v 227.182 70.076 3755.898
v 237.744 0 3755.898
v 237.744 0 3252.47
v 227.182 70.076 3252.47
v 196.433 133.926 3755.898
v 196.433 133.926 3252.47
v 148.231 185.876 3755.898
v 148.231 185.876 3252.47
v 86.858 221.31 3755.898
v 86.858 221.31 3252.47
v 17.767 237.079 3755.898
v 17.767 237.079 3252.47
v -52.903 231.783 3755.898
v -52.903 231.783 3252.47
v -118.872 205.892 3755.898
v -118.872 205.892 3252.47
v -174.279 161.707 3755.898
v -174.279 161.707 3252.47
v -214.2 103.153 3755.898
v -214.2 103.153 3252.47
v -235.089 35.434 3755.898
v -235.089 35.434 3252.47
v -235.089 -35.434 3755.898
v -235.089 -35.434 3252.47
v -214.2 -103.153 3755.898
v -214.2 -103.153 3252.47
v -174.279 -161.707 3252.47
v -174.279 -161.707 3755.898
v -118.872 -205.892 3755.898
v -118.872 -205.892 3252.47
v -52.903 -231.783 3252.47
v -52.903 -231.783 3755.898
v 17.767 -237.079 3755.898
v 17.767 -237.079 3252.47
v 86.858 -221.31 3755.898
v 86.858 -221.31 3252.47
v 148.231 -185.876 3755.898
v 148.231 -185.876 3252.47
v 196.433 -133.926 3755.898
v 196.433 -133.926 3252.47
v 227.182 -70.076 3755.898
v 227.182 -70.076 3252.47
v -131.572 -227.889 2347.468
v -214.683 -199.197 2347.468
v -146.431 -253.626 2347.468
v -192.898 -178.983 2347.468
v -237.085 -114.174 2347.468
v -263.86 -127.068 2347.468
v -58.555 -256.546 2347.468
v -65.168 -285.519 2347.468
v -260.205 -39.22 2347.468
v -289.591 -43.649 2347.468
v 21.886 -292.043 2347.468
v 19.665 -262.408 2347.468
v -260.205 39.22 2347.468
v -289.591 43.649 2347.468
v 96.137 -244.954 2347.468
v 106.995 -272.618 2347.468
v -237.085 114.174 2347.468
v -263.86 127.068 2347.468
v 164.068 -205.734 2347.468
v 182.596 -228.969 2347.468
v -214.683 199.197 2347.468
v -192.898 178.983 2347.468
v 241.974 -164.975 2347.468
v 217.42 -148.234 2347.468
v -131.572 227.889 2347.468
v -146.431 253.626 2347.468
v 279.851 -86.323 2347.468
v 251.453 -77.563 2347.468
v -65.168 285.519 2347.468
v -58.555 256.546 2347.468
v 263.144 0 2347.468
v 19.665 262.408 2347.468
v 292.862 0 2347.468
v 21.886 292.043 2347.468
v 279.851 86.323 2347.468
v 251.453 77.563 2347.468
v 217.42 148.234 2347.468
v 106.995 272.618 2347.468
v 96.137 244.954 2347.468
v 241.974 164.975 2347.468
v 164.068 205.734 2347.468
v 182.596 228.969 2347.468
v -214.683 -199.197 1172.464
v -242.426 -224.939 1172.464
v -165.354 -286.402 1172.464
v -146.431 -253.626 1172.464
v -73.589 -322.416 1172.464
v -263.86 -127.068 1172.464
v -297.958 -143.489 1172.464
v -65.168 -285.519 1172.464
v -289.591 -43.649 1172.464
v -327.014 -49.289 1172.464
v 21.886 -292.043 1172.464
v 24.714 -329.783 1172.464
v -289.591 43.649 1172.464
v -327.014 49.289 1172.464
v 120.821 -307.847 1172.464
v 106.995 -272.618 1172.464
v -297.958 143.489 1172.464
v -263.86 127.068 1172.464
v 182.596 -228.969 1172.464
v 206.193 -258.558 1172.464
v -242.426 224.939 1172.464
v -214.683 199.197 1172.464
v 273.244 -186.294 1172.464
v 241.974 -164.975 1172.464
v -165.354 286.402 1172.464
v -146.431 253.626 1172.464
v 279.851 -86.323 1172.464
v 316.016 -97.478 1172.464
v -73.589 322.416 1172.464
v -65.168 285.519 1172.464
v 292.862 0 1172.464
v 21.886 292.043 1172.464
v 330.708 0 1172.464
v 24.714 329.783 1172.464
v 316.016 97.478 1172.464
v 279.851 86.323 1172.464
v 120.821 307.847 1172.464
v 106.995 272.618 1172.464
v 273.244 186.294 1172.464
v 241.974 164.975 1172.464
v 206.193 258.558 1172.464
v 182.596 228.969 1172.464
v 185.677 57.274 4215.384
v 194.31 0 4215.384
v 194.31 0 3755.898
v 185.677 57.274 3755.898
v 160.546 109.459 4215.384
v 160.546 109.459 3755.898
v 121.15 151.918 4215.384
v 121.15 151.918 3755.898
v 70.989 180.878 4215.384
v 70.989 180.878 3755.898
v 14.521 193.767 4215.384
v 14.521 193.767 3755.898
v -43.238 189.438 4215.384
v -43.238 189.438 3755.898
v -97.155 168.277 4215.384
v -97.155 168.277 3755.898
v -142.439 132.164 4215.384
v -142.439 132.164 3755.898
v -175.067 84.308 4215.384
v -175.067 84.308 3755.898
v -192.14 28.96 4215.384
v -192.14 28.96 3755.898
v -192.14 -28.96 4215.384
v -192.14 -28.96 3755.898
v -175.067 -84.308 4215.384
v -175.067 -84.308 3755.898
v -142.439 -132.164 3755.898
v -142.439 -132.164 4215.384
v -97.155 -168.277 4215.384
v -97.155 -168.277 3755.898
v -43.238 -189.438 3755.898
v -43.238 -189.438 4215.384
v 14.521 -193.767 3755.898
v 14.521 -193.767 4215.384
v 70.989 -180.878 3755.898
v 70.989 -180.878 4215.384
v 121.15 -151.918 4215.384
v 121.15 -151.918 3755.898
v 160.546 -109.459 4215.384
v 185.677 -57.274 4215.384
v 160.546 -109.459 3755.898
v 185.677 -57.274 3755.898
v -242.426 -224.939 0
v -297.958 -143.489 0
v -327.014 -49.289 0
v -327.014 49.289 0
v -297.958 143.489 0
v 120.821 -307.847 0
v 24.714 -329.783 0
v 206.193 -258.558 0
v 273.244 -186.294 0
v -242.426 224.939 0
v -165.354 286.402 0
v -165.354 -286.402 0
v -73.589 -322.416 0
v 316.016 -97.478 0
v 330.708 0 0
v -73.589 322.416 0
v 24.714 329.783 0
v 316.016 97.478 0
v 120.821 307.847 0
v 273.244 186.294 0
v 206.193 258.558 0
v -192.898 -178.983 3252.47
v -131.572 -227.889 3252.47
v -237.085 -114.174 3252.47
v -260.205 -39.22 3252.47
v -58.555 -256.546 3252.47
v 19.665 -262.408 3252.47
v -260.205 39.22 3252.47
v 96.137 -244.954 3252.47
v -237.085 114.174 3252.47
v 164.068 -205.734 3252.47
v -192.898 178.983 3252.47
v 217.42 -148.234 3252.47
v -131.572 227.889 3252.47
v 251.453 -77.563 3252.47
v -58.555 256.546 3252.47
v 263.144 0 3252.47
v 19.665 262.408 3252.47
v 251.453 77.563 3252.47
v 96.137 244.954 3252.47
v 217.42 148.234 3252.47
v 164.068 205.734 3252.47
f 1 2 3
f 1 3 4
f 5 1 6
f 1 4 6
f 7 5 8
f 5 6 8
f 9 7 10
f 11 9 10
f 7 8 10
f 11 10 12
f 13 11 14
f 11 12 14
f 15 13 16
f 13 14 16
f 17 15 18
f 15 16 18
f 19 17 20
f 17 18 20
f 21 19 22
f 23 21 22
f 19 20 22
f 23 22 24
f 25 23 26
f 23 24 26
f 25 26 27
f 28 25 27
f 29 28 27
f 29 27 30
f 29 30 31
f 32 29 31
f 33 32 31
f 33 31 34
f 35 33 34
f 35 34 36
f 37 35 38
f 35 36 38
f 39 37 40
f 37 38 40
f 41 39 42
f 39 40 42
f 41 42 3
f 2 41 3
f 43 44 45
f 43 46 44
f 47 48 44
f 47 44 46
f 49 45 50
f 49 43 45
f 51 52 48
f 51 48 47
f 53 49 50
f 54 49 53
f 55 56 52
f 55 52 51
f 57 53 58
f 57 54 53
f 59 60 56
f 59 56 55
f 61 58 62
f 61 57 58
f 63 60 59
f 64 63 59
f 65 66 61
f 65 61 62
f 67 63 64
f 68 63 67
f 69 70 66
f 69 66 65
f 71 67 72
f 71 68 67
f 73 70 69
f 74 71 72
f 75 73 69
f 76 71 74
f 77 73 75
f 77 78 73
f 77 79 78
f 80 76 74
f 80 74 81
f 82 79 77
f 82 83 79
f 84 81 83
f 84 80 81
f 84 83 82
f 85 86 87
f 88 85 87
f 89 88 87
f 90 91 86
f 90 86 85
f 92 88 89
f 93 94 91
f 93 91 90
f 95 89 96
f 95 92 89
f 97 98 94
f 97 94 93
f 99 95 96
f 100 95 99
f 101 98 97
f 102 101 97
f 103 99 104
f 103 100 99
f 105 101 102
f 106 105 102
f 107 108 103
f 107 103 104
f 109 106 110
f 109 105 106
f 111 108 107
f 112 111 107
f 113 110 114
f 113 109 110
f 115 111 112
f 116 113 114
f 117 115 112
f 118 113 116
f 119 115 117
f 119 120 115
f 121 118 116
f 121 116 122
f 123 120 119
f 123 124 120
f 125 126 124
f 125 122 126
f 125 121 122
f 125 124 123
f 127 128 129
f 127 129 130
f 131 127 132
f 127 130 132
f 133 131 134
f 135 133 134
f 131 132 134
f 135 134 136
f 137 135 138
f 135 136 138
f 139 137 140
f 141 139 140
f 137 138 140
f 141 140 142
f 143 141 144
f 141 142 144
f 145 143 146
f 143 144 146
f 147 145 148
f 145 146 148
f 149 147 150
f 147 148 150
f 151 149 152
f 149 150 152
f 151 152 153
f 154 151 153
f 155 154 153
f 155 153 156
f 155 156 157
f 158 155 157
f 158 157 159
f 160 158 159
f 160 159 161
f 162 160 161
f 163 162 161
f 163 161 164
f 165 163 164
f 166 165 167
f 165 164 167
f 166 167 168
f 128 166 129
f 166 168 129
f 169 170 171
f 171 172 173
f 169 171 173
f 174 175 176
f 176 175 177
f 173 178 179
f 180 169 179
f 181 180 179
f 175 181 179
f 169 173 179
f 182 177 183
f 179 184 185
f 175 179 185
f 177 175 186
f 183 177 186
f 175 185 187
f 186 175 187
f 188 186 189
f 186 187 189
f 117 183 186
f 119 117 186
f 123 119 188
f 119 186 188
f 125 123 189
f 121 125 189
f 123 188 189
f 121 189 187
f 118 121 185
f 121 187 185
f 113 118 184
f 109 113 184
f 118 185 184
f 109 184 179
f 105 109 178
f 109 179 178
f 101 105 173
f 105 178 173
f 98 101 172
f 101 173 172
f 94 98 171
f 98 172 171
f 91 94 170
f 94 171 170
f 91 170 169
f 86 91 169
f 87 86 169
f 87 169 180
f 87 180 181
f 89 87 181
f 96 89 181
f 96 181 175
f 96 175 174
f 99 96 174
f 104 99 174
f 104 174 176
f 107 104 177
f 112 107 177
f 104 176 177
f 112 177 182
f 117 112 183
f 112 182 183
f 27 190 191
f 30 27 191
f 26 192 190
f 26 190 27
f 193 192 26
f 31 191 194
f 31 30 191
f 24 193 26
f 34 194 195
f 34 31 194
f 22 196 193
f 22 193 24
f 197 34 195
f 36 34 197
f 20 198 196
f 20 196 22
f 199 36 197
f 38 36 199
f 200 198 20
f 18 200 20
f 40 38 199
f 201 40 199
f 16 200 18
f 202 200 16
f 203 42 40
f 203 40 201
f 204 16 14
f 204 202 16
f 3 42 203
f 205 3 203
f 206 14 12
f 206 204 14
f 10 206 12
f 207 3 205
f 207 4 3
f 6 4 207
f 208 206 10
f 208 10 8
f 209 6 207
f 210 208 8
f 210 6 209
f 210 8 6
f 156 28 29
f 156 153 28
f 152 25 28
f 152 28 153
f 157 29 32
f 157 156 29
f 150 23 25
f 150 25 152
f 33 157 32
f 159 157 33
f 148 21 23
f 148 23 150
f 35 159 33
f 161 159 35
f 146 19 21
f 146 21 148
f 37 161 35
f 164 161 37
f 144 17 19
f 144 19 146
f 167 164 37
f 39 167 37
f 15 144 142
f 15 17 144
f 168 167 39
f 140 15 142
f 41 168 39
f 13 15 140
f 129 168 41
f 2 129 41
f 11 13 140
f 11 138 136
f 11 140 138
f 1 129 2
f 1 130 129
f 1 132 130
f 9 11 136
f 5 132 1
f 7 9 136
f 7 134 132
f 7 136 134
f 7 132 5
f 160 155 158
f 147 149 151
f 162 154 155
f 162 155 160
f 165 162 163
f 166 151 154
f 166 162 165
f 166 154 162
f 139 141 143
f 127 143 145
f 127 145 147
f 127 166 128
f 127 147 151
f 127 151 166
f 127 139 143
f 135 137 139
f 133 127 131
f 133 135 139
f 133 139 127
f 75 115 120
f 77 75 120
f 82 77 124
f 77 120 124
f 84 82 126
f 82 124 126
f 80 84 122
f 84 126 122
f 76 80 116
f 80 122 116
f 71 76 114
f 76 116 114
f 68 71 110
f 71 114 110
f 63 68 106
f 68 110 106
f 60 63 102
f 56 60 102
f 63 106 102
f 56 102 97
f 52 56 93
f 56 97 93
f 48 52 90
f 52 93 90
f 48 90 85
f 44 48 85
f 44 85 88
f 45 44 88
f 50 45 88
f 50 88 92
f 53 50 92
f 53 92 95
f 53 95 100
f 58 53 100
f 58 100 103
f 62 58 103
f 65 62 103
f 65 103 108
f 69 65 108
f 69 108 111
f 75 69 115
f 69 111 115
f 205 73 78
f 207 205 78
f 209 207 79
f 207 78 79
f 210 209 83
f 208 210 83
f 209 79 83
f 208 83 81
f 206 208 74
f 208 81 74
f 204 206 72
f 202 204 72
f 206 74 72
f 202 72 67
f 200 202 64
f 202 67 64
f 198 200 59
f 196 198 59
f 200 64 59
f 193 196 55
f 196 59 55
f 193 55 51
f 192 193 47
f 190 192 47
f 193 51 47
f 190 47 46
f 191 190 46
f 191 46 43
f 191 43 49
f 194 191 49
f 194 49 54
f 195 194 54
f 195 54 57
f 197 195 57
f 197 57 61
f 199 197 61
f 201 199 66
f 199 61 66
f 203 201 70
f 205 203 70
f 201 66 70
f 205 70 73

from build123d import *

# Parameters (mm, degrees)
F0_R     = 330.708
F1_DEPTH = 1172.464
F2_R     = 292.862
F3_DEPTH = 1175.004
F4_R     = 263.144
F5_DEPTH = 905.002
F6_R     = 237.744
F7_DEPTH = 503.428
F8_R     = 194.31
F9_DEPTH = 459.486


with BuildPart() as f1:
    # F0 (on Top) → F1 (new body)
    with BuildSketch(Plane.XY):
        Circle(F0_R)
    extrude(amount=F1_DEPTH)

    # F2 (on face) → F3 (join)
    with BuildSketch(Plane.XY.offset(1172.464)):
        Circle(F2_R)
    extrude(amount=F3_DEPTH)

    # F4 (on face) → F5 (join)
    with BuildSketch(Plane.XY.offset(2347.468)):
        Circle(F4_R)
    extrude(amount=F5_DEPTH)

    # F6 (on face) → F7 (join)
    with BuildSketch(Plane.XY.offset(3252.47)):
        Circle(F6_R)
    extrude(amount=F7_DEPTH)

    # F8 (on face) → F9 (join)
    with BuildSketch(Plane.XY.offset(3755.898)):
        Circle(F8_R)
    extrude(amount=F9_DEPTH)


solid = f1.part
